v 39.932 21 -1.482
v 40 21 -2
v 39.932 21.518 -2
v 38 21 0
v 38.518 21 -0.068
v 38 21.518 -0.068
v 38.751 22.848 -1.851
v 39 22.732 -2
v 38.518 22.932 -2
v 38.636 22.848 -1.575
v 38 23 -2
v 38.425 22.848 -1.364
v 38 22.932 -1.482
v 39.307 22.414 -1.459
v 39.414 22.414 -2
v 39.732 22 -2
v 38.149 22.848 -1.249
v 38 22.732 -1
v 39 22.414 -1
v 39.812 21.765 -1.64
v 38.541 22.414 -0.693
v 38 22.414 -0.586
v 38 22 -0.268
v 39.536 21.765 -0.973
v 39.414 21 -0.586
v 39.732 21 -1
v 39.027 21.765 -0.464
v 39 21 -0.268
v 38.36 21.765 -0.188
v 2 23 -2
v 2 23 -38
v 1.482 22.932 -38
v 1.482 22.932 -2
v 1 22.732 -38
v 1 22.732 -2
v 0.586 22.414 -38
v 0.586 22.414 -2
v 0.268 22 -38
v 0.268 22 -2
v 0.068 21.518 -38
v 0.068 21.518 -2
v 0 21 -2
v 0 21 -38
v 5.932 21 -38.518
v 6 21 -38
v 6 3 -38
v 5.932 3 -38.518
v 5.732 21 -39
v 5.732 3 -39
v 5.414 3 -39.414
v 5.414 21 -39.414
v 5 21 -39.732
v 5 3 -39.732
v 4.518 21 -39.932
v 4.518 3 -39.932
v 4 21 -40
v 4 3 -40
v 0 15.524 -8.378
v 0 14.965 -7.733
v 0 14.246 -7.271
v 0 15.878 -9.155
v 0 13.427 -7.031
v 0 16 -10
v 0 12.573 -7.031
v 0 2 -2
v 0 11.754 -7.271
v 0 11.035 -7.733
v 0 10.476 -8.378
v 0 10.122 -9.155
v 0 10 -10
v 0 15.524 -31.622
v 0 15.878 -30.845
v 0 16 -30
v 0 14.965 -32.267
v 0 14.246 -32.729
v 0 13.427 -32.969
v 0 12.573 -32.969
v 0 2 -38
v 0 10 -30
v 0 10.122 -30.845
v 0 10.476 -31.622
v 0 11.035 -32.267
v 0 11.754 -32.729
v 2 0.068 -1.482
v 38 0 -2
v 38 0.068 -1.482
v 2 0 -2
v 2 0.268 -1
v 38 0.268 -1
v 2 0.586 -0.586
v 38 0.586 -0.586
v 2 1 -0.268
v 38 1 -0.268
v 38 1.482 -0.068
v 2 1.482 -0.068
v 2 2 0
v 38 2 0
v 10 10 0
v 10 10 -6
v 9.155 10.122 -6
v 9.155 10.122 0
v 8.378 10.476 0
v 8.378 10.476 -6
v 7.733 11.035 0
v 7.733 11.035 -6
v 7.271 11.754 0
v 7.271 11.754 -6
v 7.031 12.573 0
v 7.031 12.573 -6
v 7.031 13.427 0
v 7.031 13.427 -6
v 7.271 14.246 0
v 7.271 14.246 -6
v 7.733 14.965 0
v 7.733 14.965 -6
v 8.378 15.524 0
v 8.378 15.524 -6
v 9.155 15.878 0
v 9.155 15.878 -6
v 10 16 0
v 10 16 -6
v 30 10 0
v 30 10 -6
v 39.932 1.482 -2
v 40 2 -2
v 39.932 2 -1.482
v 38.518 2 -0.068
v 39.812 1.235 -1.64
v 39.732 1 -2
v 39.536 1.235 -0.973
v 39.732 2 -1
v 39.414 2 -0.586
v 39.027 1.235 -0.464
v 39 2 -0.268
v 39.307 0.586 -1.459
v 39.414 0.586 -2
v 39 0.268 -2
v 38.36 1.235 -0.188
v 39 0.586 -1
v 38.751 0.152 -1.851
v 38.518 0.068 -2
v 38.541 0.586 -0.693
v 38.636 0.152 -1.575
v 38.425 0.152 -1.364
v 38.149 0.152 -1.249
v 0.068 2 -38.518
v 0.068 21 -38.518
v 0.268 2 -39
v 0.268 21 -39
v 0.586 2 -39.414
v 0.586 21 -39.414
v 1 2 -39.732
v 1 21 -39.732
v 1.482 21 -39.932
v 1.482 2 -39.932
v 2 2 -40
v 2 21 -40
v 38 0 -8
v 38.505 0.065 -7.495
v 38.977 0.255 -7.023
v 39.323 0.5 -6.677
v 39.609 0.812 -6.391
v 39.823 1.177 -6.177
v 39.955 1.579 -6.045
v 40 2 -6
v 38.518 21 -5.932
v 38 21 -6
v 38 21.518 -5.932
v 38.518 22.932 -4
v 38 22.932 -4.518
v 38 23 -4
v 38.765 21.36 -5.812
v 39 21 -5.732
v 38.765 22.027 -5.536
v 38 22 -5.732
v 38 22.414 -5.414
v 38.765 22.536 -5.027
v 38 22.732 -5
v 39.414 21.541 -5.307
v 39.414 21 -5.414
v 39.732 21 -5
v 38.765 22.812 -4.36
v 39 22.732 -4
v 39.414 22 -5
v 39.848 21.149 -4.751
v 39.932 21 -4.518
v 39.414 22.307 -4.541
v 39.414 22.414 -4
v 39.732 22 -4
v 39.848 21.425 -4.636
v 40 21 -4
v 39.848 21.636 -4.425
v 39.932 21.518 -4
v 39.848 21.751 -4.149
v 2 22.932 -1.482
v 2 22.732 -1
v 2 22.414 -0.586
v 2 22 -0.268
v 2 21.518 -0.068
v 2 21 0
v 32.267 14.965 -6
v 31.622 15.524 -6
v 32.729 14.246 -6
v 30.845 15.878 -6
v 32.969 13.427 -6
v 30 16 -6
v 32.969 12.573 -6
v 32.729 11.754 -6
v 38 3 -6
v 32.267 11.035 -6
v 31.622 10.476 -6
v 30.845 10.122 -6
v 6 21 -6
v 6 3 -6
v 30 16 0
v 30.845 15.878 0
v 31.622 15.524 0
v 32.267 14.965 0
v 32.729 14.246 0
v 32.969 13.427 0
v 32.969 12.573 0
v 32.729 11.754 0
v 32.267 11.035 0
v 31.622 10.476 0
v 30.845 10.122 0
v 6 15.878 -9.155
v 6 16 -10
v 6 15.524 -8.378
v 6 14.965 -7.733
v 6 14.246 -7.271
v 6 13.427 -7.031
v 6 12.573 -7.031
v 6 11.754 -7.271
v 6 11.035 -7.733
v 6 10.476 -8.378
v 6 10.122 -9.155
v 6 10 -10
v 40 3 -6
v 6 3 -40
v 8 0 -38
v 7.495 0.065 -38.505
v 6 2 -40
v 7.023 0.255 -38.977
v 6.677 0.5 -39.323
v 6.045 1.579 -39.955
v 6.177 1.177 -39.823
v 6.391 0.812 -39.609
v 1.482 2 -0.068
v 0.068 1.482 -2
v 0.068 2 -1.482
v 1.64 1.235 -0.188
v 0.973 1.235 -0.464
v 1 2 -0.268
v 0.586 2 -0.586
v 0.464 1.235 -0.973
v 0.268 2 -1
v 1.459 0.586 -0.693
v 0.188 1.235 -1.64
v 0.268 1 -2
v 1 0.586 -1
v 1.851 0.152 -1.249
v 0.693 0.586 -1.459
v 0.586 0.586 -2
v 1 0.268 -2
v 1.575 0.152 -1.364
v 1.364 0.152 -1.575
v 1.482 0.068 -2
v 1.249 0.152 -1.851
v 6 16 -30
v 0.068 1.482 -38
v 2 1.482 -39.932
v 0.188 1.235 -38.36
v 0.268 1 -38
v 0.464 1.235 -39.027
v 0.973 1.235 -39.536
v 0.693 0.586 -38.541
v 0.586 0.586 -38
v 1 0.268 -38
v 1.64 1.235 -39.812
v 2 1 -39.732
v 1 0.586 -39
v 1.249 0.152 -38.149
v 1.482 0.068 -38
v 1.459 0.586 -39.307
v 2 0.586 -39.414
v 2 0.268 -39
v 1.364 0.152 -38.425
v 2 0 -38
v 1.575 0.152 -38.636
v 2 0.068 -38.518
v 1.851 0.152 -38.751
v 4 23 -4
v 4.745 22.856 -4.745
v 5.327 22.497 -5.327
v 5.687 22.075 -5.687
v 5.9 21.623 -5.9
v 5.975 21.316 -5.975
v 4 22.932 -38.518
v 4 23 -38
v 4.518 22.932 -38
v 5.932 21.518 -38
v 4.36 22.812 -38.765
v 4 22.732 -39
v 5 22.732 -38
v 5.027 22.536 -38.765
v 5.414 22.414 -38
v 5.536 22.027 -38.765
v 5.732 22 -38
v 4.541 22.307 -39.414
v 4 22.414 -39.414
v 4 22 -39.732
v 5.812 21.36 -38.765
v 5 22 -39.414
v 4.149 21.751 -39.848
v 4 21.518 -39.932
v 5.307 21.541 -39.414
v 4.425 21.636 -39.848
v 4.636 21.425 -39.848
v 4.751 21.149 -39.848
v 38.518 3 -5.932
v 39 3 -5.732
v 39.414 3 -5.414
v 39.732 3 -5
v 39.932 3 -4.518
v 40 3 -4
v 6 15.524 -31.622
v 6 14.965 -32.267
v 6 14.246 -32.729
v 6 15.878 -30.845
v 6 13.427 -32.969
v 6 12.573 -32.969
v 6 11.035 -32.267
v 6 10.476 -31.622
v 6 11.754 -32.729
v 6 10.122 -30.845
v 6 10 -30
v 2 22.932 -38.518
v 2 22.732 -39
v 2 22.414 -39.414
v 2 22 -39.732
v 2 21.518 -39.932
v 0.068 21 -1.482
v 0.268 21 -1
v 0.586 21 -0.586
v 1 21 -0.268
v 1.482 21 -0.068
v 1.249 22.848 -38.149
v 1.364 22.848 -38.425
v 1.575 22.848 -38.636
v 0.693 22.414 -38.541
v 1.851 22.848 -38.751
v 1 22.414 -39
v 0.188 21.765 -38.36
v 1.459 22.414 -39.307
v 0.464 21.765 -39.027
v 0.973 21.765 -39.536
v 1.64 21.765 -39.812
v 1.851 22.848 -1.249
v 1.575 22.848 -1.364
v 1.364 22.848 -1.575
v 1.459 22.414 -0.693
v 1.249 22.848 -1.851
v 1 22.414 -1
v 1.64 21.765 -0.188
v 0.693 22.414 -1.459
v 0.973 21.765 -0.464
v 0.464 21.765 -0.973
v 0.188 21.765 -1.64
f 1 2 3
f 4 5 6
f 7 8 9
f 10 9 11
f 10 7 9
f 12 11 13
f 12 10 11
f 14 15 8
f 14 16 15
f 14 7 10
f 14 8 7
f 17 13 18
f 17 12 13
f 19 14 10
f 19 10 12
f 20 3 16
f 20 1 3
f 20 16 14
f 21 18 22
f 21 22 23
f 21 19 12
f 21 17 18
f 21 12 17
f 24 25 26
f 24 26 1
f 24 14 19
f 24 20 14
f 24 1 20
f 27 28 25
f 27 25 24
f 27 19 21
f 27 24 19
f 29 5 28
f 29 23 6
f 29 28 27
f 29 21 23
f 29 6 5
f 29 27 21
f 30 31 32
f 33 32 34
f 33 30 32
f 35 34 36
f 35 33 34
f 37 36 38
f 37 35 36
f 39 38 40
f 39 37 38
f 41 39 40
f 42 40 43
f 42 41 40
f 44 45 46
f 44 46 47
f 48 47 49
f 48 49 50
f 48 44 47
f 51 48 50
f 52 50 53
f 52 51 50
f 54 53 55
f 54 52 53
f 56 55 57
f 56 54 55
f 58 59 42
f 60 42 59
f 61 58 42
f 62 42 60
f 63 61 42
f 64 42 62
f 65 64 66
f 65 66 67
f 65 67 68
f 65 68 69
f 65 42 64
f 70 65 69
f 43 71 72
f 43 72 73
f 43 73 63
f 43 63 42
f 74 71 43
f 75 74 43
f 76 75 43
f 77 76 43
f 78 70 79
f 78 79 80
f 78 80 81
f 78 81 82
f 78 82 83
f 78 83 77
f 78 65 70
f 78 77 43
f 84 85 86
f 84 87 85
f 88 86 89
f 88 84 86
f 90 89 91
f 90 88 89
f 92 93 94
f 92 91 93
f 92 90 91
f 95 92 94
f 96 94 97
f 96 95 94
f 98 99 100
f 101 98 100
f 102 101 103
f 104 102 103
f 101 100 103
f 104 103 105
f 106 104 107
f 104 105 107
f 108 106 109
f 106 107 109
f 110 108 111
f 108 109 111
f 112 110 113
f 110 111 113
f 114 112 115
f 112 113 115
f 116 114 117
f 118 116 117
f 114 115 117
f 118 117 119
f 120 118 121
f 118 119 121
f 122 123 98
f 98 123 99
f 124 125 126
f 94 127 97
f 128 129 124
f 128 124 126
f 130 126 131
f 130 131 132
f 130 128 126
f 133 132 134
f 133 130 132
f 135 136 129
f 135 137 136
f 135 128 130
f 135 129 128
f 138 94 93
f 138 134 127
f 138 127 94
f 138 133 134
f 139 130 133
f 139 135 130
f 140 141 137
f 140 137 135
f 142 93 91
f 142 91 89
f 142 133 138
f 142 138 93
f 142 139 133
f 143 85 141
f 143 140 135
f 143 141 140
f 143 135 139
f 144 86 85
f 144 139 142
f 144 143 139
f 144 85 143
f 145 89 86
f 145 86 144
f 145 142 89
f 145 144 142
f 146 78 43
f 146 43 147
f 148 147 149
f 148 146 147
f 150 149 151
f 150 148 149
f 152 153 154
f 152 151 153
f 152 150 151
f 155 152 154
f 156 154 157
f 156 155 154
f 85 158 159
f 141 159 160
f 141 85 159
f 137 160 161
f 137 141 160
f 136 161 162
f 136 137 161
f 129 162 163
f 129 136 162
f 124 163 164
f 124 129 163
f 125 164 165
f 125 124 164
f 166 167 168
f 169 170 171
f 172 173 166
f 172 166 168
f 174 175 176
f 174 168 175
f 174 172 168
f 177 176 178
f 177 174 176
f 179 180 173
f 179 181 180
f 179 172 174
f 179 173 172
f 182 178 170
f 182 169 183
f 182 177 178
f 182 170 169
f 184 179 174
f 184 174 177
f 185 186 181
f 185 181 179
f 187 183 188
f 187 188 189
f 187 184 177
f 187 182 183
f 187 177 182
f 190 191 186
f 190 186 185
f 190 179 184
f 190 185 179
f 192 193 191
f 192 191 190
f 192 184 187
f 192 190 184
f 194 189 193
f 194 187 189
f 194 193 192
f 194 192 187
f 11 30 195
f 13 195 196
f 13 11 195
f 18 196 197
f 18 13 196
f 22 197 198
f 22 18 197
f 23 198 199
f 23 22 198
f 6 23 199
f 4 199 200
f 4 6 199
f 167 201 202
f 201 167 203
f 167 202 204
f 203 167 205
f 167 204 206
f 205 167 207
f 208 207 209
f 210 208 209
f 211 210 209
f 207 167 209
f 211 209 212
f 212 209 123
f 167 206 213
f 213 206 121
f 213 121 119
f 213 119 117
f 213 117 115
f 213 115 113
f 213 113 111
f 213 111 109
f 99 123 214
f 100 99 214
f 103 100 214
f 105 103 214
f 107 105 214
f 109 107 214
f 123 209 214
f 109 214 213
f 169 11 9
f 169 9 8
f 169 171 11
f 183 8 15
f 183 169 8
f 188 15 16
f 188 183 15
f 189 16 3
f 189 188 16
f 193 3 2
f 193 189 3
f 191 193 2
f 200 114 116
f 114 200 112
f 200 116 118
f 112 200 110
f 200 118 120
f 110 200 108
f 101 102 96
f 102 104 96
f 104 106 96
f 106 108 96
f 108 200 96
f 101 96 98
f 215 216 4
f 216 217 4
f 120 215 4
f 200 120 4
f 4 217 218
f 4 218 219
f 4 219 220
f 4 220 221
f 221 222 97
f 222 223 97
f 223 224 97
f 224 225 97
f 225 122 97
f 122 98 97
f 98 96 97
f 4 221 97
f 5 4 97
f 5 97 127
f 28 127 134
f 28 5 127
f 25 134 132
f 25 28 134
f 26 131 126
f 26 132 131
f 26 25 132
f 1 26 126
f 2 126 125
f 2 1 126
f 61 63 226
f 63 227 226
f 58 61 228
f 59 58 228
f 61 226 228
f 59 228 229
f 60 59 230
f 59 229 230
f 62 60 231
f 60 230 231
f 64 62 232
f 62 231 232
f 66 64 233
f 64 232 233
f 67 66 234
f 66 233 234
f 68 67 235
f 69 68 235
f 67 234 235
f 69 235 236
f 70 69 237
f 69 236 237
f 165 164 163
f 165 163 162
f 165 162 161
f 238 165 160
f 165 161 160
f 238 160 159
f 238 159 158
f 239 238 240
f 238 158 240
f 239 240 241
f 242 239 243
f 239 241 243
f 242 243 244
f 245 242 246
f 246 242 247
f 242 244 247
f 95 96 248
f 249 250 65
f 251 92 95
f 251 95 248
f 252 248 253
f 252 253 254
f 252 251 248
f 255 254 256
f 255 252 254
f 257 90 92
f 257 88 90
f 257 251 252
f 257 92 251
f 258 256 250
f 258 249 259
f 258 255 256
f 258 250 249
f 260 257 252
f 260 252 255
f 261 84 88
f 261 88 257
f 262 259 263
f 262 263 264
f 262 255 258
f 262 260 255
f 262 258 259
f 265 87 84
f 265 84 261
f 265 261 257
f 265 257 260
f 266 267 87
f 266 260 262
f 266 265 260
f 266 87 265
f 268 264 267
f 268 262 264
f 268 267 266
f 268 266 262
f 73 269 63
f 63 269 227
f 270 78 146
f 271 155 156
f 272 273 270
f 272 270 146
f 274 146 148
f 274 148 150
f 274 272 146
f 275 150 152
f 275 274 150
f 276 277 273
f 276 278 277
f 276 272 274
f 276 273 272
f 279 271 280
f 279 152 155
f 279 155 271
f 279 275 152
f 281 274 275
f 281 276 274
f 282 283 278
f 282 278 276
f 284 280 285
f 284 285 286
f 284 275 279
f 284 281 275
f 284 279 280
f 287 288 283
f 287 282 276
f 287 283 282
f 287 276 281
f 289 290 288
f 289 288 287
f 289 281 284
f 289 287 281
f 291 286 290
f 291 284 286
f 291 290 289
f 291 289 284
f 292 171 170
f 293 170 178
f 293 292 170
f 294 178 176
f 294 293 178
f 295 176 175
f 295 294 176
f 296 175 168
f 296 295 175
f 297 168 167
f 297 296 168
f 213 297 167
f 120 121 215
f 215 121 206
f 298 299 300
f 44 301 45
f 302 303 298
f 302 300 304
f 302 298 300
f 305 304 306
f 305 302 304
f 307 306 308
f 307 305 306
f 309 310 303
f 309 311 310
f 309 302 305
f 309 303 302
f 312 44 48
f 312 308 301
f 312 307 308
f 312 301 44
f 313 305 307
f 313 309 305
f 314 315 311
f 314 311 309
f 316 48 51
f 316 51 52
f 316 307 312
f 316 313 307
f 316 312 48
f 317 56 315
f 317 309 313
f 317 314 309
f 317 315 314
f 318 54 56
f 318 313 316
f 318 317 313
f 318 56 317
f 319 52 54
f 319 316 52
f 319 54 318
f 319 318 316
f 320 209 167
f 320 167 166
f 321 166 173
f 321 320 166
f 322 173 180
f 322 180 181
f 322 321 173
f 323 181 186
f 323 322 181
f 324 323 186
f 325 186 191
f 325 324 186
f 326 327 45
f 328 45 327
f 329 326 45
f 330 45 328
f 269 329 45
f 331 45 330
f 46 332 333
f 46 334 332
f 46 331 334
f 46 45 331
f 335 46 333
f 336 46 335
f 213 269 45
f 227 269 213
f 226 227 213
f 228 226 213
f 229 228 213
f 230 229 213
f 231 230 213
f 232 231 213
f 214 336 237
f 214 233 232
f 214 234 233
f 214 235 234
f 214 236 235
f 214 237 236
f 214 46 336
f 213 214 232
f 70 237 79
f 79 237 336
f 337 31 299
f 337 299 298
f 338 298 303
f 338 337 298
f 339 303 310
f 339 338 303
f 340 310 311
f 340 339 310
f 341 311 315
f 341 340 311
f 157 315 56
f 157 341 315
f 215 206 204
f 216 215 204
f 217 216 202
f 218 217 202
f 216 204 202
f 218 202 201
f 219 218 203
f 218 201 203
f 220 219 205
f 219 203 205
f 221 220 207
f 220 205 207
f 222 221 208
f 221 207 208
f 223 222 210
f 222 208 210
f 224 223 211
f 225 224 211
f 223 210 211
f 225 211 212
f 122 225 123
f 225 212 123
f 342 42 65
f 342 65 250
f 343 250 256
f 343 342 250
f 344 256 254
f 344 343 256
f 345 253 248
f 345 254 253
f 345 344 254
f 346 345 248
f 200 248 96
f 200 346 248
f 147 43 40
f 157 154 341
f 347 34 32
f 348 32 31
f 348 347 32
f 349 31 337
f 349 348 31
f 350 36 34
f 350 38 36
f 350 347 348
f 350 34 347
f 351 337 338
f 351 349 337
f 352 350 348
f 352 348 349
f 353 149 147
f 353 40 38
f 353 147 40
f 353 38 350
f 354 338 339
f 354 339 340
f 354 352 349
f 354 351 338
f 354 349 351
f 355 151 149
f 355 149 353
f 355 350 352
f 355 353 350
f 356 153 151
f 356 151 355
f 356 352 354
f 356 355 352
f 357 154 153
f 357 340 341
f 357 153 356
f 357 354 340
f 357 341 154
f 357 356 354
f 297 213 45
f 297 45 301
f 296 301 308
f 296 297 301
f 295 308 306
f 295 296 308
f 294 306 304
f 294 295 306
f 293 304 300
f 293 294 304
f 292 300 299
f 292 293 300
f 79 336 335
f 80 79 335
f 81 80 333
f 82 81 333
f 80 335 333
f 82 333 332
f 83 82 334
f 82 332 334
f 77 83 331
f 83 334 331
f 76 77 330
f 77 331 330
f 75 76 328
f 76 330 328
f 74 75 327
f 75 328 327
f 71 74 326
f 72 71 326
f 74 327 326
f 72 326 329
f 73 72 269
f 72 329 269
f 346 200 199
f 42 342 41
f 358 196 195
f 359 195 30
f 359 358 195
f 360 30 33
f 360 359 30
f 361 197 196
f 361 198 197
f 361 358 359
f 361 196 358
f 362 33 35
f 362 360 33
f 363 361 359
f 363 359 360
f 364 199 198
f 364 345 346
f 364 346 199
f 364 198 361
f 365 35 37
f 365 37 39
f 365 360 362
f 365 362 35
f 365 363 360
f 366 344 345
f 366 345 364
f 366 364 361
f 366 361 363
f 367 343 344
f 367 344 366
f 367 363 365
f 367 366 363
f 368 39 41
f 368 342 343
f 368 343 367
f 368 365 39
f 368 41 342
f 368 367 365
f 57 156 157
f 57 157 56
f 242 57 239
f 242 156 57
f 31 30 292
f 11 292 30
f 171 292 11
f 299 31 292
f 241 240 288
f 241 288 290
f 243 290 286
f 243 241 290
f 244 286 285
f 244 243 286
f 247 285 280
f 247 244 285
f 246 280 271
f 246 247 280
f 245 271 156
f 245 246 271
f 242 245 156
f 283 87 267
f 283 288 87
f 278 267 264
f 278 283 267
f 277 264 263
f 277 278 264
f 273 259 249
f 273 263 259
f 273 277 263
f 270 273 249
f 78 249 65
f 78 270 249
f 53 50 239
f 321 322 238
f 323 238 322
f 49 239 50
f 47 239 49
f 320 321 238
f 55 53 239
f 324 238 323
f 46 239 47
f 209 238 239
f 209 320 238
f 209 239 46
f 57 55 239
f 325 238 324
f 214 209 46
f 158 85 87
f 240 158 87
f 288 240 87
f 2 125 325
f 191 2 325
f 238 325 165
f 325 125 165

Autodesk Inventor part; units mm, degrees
ref_plane "YZ Plane" through (0, 0, 0) normal (1, 0, 0) x (0, 1, 0)
ref_plane "XZ Plane" through (0, 0, 0) normal (0, 1, 0) x (-1, 0, 0)
ref_plane "XY Plane" through (0, 0, 0) normal (0, 0, 1) x (1, 0, 0)
sketch "Sketch1" plane through (0, 0, 0) normal (0, 1, 0) x (-1, 0, 0)
  line L0 (0, 0) -> (0, -40)
  line L1 (0, 0) -> (40, 0) construction
  line L2 (0, 0) -> (-40, 0)
  line L3 (-6, -40) -> (-6, -6)
  line L4 (-6, -6) -> (-40, -6)
  line L5 (-40, 0) -> (-40, -6)
  line L6 (0, -40) -> (-6, -40)
  line L7 (-40, -6) -> (-6, -40)
  dimension "d0" = 40
  dimension "d1" = 90
  dimension "d2" = 40
  dimension "d3" = 6
extrude "Extrusion1" add sketch "Sketch1" along normal blind 3
sketch "Sketch2" plane through (0, 3, 0) normal (0, 1, 0) x (1, 0, 0)
  line L0 (0, 40) -> (0, 0) projected
  line L1 (0, 0) -> (0, 40)
  line L2 (0, 0) -> (40, 0) projected
  line L3 (40, 0) -> (0, 0)
  line L4 (6, 40) -> (6, 0)
  line L5 (40, 6) -> (6, 6)
  line L6 (40, 6) -> (6, 40) projected
  line L7 (40, 6) -> (40, 0)
  line L8 (6, 40) -> (0, 40)
  dimension "d6" = 6
extrude "Extrusion2" add sketch "Sketch2" along normal blind 20 contours L8 L4 L2 L0 | L4 L5 L7 L2
sketch "Sketch3" plane through (6, 3, -6) normal (1, 0, 0) x (0, 0, -1)
  line L0 (34, 20) -> (-6, 20) projected
  line L1 (-6, 20) -> (4, 20)
  line L2 (4, 20) -> (4, 10)
  line L3 (4, 10) -> (24, 10) construction
  line L4 (4, 7) -> (24, 7)
  line L5 (24, 13) -> (4, 13)
  arc A0 (4, 13) -> (4, 7) centre (4, 10) ccw
  arc A1 (24, 7) -> (24, 13) centre (24, 10) ccw
  point P0 (-6, -3)
  point P1 (14, 10)
  dimension "d9" = 10
  dimension "d10" = 10
  dimension "d11" = 20
  dimension "d12" = 6
extrude "Extrusion3" cut sketch "Sketch3" against normal blind 20
sketch "Sketch4" plane through (40, 3, -6) normal (0, 0, -1) x (-1, 0, 0)
  line L0 (10, 20) -> (10, 10)
  line L1 (10, 10) -> (30, 10) construction
  line L2 (10, 7) -> (30, 7)
  line L3 (30, 13) -> (10, 13)
  arc A0 (10, 13) -> (10, 7) centre (10, 10) ccw
  arc A1 (30, 7) -> (30, 13) centre (30, 10) ccw
  line L4 (40, -3) -> (40, 20) projected
  line L5 (0, 20) -> (34, 20) projected
  point P0 (20, 10)
  dimension "d16" = 10
  dimension "d17" = 20
  dimension "d18" = 6
  dimension "d35" = 10
  dimension "d36" = 13
extrude "Extrusion4" cut sketch "Sketch4" against normal blind 20
fillet "Fillet1" radius 2 3 edges at (0, 11.5, 0) (40, 11.5, 0) (0, 11.5, -40)
fillet "Fillet2" radius 2 2 edges at (23, 23, -6) (6, 23, -23)
fillet "Fillet3" radius 2 11 edges at (39.4142, 23, -0.5858) (40, 23, -3) (40, 22.4142, -5.4142) (40, 12, -6) (0.5858, 23, -0.5858) (0, 23, -20) (0.5858, 23, -39.4142) (3, 23, -40) (5.4142, 22.4142, -40) (6, 12, -40) (20, 23, 0)
fillet "Fillet4" radius 2 7 edges at (0.5858, 0, -39.4142) (4, 0, -40) (0.5858, 0, -0.5858) (20, 0, 0) (39.4142, 0, -0.5858) (40, 0, -4) (0, 0, -20)
properties part number "RightAngle_Bracket"
